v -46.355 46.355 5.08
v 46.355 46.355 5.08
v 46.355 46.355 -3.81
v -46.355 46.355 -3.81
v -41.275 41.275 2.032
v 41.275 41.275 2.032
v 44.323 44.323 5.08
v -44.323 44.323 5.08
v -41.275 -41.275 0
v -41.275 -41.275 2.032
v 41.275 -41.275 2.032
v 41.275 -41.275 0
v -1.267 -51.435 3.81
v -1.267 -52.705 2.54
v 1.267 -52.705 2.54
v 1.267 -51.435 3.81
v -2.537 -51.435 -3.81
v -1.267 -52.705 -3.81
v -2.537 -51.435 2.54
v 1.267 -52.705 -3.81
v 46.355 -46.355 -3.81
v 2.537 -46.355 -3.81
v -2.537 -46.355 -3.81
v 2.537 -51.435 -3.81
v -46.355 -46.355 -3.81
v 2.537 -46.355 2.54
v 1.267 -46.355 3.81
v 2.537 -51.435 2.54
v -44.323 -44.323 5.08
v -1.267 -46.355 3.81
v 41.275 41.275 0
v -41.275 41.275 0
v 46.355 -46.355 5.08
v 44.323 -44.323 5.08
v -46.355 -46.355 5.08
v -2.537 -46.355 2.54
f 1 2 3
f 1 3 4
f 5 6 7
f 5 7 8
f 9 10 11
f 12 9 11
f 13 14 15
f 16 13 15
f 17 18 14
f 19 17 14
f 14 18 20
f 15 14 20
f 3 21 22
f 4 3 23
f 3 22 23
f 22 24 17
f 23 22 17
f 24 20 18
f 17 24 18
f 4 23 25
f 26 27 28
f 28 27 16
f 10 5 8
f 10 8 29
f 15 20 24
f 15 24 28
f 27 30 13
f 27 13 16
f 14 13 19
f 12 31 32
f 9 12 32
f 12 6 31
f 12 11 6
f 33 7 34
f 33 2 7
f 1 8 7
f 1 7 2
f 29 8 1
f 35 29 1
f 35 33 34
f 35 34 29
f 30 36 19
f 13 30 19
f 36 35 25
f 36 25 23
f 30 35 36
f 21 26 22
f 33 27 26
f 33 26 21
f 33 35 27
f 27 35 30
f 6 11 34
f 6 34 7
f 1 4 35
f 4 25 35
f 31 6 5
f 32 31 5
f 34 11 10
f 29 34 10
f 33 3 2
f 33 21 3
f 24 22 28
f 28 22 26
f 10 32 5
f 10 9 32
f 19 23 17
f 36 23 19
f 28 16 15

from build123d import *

# Parameters (mm, degrees)
F1_DEPTH = 41.275
F2_W     = 82.55
F2_H     = 5.08
F3_DEPTH = 5.08
F4_W     = 92.71
F4_H     = 8.89
F5_DEPTH = 5.08
F6_W     = 5.0743944012
F6_H     = 7.62
F7_DEPTH = 6.35
F8_SIZE  = 1.27
F9_SIZE  = 3.048


with BuildPart() as f1:
    # F0 (on Front) → F1 (new body, symmetric)
    with BuildSketch(Plane.XZ):
        Polygon((-41.275, -3.81), (-41.275, 0), (-41.275, 5.08), (-46.355, 5.08), (-46.355, -3.81), align=None)
        Polygon((41.275, 0), (0, 0), (-41.275, 0), (-41.275, -3.81), (41.275, -3.81), align=None)
        Polygon((41.275, 5.08), (41.275, 0), (41.275, -3.81), (46.355, -3.81), (46.355, 5.08), align=None)
    extrude(amount=F1_DEPTH, both=True)

    # F2 (on face) → F3 (join)
    with BuildSketch(Plane.XZ.offset(41.275)):
        Polygon((-46.355, 5.08), (-46.355, -3.81), (46.355, -3.81), (46.355, 5.08), (41.275, 5.08), (41.275, 0), (-41.275, 0), (-41.275, 5.08), align=None)
        with Locations((0, 2.54)):
            Rectangle(F2_W, F2_H)
    extrude(amount=F3_DEPTH)

    # F4 (on face) → F5 (join)
    with BuildSketch(Plane(origin=(0, 41.275, 0), x_dir=(-1, 0, 0), z_dir=(0, 1, 0))):
        with Locations((0, 0.635)):
            Rectangle(F4_W, F4_H)
    extrude(amount=F5_DEPTH)

    # F6 (on face) → F7 (join)
    with BuildSketch(Plane.XZ.offset(46.355)):
        Rectangle(F6_W, F6_H)
    extrude(amount=F7_DEPTH)

    # F8
    f8_edges = [f1.edges().sort_by_distance(p)[0] for p in [
        (-2.537197, -49.53, 3.81),
        (2.537197, -49.53, 3.81),
        (0, -52.705, 3.81),
        (2.537197, -52.705, 0),
        (-2.537197, -52.705, 0),
    ]]
    chamfer(f8_edges, length=F8_SIZE)

    # F9
    f9_edges = [f1.edges().sort_by_distance(p)[0] for p in [
        (-41.275, 0, 5.08),
        (0, 41.275, 5.08),
        (0, -41.275, 5.08),
        (41.275, 0, 5.08),
    ]]
    chamfer(f9_edges, length=F9_SIZE)


solid = f1.part
